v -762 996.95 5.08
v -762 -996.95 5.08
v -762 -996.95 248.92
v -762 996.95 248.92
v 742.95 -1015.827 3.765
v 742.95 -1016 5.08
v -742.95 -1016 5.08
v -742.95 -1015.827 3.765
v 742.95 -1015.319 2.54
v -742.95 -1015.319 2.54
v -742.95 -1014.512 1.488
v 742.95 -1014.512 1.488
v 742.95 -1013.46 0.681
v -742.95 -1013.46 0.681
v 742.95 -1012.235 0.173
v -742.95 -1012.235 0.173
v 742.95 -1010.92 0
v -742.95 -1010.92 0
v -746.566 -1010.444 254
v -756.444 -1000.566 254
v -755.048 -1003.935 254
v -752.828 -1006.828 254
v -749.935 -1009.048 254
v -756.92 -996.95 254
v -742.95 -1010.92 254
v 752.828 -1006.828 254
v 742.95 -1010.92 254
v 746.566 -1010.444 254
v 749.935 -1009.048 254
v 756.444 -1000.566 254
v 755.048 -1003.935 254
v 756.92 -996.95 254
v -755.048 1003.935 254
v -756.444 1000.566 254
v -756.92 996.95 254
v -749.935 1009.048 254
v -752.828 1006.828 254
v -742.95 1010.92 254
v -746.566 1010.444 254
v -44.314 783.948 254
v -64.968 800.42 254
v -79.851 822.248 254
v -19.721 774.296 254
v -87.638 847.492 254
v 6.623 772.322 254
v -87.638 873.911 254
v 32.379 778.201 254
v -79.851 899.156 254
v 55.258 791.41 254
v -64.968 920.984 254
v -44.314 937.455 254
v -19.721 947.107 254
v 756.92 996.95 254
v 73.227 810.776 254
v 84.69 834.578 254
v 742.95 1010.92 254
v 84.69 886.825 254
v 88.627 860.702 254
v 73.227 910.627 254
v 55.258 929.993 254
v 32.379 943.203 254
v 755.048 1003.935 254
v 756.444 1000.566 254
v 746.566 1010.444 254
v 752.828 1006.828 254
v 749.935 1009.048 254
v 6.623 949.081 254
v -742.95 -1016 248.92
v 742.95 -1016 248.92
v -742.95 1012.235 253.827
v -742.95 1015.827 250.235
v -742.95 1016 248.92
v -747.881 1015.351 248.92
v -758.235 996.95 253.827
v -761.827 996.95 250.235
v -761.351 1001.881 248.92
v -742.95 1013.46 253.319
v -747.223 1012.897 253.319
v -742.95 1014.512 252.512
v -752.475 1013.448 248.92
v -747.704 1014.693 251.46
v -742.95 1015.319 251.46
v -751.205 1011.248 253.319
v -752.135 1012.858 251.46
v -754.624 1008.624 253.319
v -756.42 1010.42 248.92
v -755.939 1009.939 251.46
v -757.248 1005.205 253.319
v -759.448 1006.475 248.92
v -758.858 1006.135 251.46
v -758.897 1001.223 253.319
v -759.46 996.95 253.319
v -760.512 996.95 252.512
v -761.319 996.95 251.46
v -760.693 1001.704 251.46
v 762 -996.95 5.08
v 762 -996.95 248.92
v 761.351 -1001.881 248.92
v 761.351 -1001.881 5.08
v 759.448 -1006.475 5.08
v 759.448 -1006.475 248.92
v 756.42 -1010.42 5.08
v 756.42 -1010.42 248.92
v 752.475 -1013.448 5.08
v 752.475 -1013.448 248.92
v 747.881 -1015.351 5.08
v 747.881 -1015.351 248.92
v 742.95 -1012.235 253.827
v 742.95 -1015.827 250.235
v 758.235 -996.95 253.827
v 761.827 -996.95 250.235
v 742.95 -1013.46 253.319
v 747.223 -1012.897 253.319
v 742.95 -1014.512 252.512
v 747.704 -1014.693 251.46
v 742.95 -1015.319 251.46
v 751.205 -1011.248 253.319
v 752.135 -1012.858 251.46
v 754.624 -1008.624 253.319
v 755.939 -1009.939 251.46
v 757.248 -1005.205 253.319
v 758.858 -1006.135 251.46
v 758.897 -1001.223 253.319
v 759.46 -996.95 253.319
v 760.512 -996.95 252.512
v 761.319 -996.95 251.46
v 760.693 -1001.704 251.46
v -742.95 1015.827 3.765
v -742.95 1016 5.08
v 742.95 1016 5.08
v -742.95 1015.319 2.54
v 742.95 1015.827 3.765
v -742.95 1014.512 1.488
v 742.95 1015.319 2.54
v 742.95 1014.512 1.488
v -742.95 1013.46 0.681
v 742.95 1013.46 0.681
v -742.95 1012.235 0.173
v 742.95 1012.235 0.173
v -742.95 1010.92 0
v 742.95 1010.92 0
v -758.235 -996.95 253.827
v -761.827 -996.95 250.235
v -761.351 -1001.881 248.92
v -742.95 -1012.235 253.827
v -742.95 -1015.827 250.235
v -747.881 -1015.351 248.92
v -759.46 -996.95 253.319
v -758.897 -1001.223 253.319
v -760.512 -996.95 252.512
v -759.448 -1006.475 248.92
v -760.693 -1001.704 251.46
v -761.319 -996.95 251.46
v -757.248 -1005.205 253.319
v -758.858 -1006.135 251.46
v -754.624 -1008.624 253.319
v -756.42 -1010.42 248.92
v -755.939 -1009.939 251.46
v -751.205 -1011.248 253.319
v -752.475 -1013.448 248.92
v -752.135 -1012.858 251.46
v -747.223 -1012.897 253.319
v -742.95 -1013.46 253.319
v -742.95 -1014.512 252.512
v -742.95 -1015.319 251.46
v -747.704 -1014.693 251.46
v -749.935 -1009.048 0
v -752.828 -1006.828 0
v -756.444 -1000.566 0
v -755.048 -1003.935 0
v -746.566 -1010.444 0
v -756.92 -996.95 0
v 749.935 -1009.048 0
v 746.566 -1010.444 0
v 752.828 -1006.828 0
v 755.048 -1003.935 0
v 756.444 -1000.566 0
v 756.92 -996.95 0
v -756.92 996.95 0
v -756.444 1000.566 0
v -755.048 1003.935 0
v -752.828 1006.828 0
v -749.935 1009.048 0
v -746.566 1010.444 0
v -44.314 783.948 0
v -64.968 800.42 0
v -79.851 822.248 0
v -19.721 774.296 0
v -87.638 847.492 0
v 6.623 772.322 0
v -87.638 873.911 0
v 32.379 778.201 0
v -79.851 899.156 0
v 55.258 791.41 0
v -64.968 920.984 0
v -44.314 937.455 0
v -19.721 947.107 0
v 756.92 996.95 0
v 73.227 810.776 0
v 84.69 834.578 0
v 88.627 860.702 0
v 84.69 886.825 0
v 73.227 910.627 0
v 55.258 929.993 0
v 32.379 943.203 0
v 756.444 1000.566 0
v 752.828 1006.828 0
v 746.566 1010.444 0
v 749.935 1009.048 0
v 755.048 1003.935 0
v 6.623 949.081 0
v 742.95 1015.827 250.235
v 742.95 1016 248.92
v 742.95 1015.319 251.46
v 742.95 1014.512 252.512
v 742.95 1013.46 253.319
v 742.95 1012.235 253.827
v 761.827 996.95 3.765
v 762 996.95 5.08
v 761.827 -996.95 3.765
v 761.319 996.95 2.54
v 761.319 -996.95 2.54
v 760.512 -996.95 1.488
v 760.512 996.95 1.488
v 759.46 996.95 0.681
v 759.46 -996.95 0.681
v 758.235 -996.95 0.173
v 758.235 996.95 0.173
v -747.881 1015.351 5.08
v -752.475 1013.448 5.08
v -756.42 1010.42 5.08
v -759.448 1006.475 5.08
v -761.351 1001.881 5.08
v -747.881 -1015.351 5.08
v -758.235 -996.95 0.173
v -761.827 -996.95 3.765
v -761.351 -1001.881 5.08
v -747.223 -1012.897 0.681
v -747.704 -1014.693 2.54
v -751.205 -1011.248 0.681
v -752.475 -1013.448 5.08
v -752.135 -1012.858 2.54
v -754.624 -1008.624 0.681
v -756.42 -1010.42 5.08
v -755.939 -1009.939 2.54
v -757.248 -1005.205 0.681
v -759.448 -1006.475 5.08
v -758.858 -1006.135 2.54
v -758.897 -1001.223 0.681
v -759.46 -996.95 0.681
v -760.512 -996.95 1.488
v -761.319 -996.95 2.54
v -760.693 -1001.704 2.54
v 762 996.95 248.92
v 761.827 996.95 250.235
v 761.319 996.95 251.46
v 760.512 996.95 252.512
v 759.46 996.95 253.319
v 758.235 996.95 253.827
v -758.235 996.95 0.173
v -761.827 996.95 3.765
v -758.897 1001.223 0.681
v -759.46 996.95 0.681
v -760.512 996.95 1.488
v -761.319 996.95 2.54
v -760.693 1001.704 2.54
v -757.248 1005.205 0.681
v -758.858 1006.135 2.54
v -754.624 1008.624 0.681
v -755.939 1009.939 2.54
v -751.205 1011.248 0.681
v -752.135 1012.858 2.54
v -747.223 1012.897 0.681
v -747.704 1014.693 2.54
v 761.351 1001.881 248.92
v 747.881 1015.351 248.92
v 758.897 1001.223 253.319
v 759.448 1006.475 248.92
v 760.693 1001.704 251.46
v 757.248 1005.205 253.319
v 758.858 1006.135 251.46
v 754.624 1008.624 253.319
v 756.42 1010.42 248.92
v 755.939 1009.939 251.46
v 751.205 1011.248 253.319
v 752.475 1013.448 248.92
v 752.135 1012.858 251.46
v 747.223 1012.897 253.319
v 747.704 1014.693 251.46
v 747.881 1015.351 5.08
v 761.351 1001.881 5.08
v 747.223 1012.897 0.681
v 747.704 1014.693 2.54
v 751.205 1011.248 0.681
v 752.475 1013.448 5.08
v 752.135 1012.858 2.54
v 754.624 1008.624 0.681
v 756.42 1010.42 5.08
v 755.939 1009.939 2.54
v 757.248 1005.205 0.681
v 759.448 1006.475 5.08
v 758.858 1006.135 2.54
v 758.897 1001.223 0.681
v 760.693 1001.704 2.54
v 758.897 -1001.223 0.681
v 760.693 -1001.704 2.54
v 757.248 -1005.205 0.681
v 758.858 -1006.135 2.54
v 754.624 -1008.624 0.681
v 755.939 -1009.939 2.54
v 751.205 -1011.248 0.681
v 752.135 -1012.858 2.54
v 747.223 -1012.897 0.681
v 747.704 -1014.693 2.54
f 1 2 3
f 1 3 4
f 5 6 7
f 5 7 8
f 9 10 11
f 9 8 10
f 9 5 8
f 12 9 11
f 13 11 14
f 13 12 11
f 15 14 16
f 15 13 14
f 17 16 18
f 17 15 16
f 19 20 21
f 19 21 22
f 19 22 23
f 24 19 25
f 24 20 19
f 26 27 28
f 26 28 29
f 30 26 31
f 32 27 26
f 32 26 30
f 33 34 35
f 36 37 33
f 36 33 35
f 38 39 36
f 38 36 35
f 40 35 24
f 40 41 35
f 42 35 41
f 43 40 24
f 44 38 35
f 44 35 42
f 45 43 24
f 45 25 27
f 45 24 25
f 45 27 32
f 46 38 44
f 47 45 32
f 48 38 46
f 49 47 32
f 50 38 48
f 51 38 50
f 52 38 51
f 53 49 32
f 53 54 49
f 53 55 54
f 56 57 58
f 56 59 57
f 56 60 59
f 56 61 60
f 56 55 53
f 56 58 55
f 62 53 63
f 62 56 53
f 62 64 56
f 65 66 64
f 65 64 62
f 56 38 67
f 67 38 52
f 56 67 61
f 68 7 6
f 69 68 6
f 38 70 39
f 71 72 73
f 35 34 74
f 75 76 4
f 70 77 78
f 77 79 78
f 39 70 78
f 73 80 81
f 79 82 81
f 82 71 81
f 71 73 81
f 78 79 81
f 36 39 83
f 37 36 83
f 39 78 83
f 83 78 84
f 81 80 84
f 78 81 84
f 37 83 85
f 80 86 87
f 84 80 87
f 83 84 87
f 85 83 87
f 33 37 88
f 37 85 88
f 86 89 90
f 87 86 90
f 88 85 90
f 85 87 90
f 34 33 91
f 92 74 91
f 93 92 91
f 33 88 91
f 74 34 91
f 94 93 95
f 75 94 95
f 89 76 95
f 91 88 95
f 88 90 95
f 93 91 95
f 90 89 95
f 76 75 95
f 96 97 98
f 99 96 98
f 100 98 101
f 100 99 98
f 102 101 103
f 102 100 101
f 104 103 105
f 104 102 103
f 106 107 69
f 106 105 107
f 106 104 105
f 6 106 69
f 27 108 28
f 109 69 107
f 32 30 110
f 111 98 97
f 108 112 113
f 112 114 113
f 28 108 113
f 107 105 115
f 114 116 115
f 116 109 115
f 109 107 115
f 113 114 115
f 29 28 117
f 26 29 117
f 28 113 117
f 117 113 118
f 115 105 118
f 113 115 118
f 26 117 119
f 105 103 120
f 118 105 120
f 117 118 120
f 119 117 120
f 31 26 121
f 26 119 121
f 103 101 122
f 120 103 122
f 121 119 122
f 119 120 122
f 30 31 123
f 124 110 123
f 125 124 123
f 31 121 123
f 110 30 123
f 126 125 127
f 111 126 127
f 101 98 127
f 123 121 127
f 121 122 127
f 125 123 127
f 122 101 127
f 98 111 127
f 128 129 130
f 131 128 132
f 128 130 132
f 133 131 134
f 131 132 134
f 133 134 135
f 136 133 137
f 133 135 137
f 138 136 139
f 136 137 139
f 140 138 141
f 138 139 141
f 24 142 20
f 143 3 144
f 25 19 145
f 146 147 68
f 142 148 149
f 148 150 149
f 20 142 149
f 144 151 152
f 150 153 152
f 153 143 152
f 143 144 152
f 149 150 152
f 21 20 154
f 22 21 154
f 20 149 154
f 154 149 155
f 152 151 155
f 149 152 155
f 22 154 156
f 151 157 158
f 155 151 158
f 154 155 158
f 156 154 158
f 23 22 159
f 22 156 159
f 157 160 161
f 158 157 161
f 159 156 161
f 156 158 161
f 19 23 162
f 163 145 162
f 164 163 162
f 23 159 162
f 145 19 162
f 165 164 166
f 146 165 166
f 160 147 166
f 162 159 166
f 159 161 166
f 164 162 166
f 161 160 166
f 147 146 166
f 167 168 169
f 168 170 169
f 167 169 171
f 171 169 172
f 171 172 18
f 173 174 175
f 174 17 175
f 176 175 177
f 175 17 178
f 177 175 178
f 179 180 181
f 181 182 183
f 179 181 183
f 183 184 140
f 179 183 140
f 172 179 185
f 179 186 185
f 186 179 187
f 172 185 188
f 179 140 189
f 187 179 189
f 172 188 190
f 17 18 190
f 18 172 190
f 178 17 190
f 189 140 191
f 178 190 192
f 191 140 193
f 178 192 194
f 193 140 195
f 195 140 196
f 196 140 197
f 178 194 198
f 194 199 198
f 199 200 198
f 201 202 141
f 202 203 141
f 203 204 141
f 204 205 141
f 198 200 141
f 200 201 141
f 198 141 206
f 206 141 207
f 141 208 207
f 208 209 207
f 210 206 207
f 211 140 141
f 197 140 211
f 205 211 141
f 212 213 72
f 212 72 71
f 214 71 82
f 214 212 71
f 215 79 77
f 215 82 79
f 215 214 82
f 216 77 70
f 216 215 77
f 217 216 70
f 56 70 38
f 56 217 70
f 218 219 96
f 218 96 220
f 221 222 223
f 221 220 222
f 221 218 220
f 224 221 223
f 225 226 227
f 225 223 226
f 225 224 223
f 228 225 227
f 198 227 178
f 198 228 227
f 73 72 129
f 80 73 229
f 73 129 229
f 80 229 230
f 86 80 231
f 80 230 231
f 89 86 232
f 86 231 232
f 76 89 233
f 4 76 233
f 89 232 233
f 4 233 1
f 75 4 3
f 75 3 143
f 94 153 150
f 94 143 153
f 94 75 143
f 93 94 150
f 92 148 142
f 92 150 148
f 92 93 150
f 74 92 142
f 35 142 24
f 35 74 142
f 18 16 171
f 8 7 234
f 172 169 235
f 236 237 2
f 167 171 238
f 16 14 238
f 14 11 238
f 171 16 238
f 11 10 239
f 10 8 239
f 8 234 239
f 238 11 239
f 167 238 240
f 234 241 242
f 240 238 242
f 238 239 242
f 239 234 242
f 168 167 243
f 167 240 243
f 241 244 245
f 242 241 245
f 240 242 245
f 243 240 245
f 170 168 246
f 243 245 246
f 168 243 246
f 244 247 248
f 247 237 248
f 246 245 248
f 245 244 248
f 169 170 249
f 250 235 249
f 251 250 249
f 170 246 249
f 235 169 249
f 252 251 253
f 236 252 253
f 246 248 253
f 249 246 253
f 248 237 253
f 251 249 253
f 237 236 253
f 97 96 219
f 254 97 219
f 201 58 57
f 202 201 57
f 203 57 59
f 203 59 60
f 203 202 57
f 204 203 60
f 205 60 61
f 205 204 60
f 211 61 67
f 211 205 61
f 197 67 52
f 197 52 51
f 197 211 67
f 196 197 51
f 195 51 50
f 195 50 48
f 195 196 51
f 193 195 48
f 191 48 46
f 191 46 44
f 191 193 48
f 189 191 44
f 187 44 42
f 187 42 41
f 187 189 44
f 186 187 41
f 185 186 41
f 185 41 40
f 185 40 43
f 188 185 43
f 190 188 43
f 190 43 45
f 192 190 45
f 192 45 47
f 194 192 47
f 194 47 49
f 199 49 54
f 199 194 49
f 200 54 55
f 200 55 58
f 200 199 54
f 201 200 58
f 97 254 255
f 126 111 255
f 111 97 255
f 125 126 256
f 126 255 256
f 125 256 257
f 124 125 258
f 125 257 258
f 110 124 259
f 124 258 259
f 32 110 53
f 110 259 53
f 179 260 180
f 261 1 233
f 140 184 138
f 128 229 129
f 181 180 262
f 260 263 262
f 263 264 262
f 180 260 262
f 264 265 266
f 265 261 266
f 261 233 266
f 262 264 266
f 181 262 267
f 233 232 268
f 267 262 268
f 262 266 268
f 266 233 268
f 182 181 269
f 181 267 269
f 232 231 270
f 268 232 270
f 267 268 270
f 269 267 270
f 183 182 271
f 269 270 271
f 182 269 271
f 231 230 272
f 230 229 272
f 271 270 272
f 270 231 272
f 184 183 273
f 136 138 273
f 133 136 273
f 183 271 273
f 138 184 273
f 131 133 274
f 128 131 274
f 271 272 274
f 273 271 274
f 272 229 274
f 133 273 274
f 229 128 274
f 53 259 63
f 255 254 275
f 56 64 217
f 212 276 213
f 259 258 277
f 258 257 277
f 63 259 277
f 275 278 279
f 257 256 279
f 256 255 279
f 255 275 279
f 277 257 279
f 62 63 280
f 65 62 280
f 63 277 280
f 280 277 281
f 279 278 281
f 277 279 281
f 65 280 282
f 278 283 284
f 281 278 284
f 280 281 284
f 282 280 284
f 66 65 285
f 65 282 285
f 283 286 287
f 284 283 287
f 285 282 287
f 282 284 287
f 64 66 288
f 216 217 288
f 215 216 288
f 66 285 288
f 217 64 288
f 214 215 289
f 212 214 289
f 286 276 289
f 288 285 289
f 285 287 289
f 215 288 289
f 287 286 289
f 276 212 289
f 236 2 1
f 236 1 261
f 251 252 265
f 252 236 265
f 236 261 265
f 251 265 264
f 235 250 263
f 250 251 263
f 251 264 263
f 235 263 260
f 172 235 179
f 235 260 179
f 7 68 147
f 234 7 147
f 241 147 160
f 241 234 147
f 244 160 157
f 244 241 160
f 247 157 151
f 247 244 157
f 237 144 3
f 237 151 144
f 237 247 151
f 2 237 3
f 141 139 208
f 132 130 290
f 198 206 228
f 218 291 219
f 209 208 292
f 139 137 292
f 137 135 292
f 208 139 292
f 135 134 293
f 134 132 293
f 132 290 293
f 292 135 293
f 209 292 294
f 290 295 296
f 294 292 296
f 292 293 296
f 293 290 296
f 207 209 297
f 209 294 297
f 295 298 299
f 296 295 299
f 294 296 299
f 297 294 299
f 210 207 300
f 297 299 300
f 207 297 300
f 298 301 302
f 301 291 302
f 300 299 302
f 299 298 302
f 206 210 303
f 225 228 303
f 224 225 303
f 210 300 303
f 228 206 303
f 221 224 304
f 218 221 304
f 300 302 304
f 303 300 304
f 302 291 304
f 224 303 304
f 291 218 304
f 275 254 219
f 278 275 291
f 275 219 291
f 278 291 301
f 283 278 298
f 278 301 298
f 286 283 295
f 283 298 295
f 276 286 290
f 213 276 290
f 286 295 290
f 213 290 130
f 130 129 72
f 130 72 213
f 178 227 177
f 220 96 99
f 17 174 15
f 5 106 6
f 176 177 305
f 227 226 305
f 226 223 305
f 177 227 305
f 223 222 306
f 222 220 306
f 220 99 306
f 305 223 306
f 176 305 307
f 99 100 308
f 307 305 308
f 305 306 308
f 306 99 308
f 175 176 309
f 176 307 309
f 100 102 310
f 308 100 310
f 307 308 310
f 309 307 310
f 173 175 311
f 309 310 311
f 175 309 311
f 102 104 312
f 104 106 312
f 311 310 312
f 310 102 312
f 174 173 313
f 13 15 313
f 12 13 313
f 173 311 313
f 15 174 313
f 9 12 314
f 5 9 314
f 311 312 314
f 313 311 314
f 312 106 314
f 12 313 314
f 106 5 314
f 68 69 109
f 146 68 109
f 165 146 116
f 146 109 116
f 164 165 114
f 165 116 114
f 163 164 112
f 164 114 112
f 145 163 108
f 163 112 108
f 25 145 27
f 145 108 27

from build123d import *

# Parameters (mm, degrees)
F0_W         = 1524
F0_H         = 2032
F0_R         = 88.6274236121
F1_DEPTH     = 254
F2_R         = 5.08
F3_T1_DEPTH  = 254
F3_T4_ANGLE  = 90
F3_T6_ANGLE  = 90
F3_T8_ANGLE  = 90
F3_T10_ANGLE = 90
F3_T12_ANGLE = 90
F3_T14_ANGLE = 90
F3_T16_ANGLE = 90
F3_T18_ANGLE = 90


# Not quite as in the source:
# - a fillet or chamfer that OpenCascade refuses, or shapes differently, is made with other operations: its cross-section is extruded or revolved along the edge and cut away or added


with BuildPart() as f1:
    # F0 (on Top) → F1 (new body)
    with BuildSketch(Plane.XY):
        Rectangle(F0_W, F0_H)
        with Locations((0, 860.7016801834)):
            Circle(F0_R, mode=Mode.SUBTRACT)
    extrude(amount=F1_DEPTH)

    # F2
    f2_edges = [f1.edges().sort_by_distance(p)[0] for p in [
        (-762, 0, 254),
        (0, -1016, 254),
        (762, 0, 254),
        (0, 1016, 254),
        (0, 1016, 0),
        (762, 0, 0),
        (0, -1016, 0),
        (-762, 0, 0),
    ]]
    fillet(f2_edges, radius=F2_R)

    # F3: fillet of radius 19.05 on 4 edges, made by hand

    # F3_s2 → F3_t1 (cut)
    with BuildSketch(Plane.XY):
        with BuildLine():
            ThreePointArc((762, 996.95), (756.4203841816, 1010.4203841816), (742.95, 1016))
            Line((742.95, 1016), (762, 1016))
            Line((762, 1016), (762, 996.95))
        make_face()
        with BuildLine():
            ThreePointArc((762, -996.95), (756.4203841816, -1010.4203841816), (742.95, -1016))
            Line((742.95, -1016), (762, -1016))
            Line((762, -1016), (762, -996.95))
        make_face()
        with BuildLine():
            ThreePointArc((-742.95, -1016), (-756.4203841816, -1010.4203841816), (-762, -996.95))
            Line((-762, -996.95), (-762, -1016))
            Line((-762, -1016), (-742.95, -1016))
        make_face()
        with BuildLine():
            ThreePointArc((-742.95, 1016), (-756.4203841816, 1010.4203841816), (-762, 996.95))
            Line((-762, 996.95), (-762, 1016))
            Line((-762, 1016), (-742.95, 1016))
        make_face()
    extrude(amount=F3_T1_DEPTH, mode=Mode.SUBTRACT)

    # F3_s3 → F3_t4 (revolve, cut)
    with BuildSketch(Plane.XZ.offset(-996.95)):
        with BuildLine():
            ThreePointArc((-756.92, 0), (-760.5121024484, 1.4878975516), (-762, 5.08))
            Line((-762, 5.08), (-762, 0))
            Line((-762, 0), (-756.92, 0))
        make_face()
    revolve(axis=Axis((-742.95, 996.95, 0), (0, 0, -1)), revolution_arc=F3_T4_ANGLE, mode=Mode.SUBTRACT)

    # F3_s5 → F3_t6 (revolve, cut)
    with BuildSketch(Plane.YZ.offset(-742.95)):
        with BuildLine():
            ThreePointArc((1010.92, 254), (1014.5121024484, 252.5121024484), (1016, 248.92))
            Line((1016, 248.92), (1016, 254))
            Line((1016, 254), (1010.92, 254))
        make_face()
    revolve(axis=Axis((-742.95, 996.95, 254), (0, 0, 1)), revolution_arc=F3_T6_ANGLE, mode=Mode.SUBTRACT)

    # F3_s7 → F3_t8 (revolve, cut)
    with BuildSketch(Plane.YZ.offset(-742.95)):
        with BuildLine():
            ThreePointArc((-1010.92, 0), (-1014.5121024484, 1.4878975516), (-1016, 5.08))
            Line((-1016, 5.08), (-1016, 0))
            Line((-1016, 0), (-1010.92, 0))
        make_face()
    revolve(axis=Axis((-742.95, -996.95, 0), (0, 0, -1)), revolution_arc=F3_T8_ANGLE, mode=Mode.SUBTRACT)

    # F3_s9 → F3_t10 (revolve, cut)
    with BuildSketch(Plane.XZ.offset(996.95)):
        with BuildLine():
            ThreePointArc((-756.92, 254), (-760.5121024484, 252.5121024484), (-762, 248.92))
            Line((-762, 248.92), (-762, 254))
            Line((-762, 254), (-756.92, 254))
        make_face()
    revolve(axis=Axis((-742.95, -996.95, 254), (0, 0, 1)), revolution_arc=F3_T10_ANGLE, mode=Mode.SUBTRACT)

    # F3_s11 → F3_t12 (revolve, cut)
    with BuildSketch(Plane.XZ.offset(996.95)):
        with BuildLine():
            ThreePointArc((756.92, 0), (760.5121024484, 1.4878975516), (762, 5.08))
            Line((762, 5.08), (762, 0))
            Line((762, 0), (756.92, 0))
        make_face()
    revolve(axis=Axis((742.95, -996.95, 0), (0, 0, -1)), revolution_arc=F3_T12_ANGLE, mode=Mode.SUBTRACT)

    # F3_s13 → F3_t14 (revolve, cut)
    with BuildSketch(Plane.YZ.offset(742.95)):
        with BuildLine():
            ThreePointArc((-1010.92, 254), (-1014.5121024484, 252.5121024484), (-1016, 248.92))
            Line((-1016, 248.92), (-1016, 254))
            Line((-1016, 254), (-1010.92, 254))
        make_face()
    revolve(axis=Axis((742.95, -996.95, 254), (0, 0, 1)), revolution_arc=F3_T14_ANGLE, mode=Mode.SUBTRACT)

    # F3_s15 → F3_t16 (revolve, cut)
    with BuildSketch(Plane.YZ.offset(742.95)):
        with BuildLine():
            ThreePointArc((1010.92, 0), (1014.5121024484, 1.4878975516), (1016, 5.08))
            Line((1016, 5.08), (1016, 0))
            Line((1016, 0), (1010.92, 0))
        make_face()
    revolve(axis=Axis((742.95, 996.95, 0), (0, 0, -1)), revolution_arc=F3_T16_ANGLE, mode=Mode.SUBTRACT)

    # F3_s17 → F3_t18 (revolve, cut)
    with BuildSketch(Plane.XZ.offset(-996.95)):
        with BuildLine():
            ThreePointArc((756.92, 254), (760.5121024484, 252.5121024484), (762, 248.92))
            Line((762, 248.92), (762, 254))
            Line((762, 254), (756.92, 254))
        make_face()
    revolve(axis=Axis((742.95, 996.95, 254), (0, 0, 1)), revolution_arc=F3_T18_ANGLE, mode=Mode.SUBTRACT)


solid = f1.part
